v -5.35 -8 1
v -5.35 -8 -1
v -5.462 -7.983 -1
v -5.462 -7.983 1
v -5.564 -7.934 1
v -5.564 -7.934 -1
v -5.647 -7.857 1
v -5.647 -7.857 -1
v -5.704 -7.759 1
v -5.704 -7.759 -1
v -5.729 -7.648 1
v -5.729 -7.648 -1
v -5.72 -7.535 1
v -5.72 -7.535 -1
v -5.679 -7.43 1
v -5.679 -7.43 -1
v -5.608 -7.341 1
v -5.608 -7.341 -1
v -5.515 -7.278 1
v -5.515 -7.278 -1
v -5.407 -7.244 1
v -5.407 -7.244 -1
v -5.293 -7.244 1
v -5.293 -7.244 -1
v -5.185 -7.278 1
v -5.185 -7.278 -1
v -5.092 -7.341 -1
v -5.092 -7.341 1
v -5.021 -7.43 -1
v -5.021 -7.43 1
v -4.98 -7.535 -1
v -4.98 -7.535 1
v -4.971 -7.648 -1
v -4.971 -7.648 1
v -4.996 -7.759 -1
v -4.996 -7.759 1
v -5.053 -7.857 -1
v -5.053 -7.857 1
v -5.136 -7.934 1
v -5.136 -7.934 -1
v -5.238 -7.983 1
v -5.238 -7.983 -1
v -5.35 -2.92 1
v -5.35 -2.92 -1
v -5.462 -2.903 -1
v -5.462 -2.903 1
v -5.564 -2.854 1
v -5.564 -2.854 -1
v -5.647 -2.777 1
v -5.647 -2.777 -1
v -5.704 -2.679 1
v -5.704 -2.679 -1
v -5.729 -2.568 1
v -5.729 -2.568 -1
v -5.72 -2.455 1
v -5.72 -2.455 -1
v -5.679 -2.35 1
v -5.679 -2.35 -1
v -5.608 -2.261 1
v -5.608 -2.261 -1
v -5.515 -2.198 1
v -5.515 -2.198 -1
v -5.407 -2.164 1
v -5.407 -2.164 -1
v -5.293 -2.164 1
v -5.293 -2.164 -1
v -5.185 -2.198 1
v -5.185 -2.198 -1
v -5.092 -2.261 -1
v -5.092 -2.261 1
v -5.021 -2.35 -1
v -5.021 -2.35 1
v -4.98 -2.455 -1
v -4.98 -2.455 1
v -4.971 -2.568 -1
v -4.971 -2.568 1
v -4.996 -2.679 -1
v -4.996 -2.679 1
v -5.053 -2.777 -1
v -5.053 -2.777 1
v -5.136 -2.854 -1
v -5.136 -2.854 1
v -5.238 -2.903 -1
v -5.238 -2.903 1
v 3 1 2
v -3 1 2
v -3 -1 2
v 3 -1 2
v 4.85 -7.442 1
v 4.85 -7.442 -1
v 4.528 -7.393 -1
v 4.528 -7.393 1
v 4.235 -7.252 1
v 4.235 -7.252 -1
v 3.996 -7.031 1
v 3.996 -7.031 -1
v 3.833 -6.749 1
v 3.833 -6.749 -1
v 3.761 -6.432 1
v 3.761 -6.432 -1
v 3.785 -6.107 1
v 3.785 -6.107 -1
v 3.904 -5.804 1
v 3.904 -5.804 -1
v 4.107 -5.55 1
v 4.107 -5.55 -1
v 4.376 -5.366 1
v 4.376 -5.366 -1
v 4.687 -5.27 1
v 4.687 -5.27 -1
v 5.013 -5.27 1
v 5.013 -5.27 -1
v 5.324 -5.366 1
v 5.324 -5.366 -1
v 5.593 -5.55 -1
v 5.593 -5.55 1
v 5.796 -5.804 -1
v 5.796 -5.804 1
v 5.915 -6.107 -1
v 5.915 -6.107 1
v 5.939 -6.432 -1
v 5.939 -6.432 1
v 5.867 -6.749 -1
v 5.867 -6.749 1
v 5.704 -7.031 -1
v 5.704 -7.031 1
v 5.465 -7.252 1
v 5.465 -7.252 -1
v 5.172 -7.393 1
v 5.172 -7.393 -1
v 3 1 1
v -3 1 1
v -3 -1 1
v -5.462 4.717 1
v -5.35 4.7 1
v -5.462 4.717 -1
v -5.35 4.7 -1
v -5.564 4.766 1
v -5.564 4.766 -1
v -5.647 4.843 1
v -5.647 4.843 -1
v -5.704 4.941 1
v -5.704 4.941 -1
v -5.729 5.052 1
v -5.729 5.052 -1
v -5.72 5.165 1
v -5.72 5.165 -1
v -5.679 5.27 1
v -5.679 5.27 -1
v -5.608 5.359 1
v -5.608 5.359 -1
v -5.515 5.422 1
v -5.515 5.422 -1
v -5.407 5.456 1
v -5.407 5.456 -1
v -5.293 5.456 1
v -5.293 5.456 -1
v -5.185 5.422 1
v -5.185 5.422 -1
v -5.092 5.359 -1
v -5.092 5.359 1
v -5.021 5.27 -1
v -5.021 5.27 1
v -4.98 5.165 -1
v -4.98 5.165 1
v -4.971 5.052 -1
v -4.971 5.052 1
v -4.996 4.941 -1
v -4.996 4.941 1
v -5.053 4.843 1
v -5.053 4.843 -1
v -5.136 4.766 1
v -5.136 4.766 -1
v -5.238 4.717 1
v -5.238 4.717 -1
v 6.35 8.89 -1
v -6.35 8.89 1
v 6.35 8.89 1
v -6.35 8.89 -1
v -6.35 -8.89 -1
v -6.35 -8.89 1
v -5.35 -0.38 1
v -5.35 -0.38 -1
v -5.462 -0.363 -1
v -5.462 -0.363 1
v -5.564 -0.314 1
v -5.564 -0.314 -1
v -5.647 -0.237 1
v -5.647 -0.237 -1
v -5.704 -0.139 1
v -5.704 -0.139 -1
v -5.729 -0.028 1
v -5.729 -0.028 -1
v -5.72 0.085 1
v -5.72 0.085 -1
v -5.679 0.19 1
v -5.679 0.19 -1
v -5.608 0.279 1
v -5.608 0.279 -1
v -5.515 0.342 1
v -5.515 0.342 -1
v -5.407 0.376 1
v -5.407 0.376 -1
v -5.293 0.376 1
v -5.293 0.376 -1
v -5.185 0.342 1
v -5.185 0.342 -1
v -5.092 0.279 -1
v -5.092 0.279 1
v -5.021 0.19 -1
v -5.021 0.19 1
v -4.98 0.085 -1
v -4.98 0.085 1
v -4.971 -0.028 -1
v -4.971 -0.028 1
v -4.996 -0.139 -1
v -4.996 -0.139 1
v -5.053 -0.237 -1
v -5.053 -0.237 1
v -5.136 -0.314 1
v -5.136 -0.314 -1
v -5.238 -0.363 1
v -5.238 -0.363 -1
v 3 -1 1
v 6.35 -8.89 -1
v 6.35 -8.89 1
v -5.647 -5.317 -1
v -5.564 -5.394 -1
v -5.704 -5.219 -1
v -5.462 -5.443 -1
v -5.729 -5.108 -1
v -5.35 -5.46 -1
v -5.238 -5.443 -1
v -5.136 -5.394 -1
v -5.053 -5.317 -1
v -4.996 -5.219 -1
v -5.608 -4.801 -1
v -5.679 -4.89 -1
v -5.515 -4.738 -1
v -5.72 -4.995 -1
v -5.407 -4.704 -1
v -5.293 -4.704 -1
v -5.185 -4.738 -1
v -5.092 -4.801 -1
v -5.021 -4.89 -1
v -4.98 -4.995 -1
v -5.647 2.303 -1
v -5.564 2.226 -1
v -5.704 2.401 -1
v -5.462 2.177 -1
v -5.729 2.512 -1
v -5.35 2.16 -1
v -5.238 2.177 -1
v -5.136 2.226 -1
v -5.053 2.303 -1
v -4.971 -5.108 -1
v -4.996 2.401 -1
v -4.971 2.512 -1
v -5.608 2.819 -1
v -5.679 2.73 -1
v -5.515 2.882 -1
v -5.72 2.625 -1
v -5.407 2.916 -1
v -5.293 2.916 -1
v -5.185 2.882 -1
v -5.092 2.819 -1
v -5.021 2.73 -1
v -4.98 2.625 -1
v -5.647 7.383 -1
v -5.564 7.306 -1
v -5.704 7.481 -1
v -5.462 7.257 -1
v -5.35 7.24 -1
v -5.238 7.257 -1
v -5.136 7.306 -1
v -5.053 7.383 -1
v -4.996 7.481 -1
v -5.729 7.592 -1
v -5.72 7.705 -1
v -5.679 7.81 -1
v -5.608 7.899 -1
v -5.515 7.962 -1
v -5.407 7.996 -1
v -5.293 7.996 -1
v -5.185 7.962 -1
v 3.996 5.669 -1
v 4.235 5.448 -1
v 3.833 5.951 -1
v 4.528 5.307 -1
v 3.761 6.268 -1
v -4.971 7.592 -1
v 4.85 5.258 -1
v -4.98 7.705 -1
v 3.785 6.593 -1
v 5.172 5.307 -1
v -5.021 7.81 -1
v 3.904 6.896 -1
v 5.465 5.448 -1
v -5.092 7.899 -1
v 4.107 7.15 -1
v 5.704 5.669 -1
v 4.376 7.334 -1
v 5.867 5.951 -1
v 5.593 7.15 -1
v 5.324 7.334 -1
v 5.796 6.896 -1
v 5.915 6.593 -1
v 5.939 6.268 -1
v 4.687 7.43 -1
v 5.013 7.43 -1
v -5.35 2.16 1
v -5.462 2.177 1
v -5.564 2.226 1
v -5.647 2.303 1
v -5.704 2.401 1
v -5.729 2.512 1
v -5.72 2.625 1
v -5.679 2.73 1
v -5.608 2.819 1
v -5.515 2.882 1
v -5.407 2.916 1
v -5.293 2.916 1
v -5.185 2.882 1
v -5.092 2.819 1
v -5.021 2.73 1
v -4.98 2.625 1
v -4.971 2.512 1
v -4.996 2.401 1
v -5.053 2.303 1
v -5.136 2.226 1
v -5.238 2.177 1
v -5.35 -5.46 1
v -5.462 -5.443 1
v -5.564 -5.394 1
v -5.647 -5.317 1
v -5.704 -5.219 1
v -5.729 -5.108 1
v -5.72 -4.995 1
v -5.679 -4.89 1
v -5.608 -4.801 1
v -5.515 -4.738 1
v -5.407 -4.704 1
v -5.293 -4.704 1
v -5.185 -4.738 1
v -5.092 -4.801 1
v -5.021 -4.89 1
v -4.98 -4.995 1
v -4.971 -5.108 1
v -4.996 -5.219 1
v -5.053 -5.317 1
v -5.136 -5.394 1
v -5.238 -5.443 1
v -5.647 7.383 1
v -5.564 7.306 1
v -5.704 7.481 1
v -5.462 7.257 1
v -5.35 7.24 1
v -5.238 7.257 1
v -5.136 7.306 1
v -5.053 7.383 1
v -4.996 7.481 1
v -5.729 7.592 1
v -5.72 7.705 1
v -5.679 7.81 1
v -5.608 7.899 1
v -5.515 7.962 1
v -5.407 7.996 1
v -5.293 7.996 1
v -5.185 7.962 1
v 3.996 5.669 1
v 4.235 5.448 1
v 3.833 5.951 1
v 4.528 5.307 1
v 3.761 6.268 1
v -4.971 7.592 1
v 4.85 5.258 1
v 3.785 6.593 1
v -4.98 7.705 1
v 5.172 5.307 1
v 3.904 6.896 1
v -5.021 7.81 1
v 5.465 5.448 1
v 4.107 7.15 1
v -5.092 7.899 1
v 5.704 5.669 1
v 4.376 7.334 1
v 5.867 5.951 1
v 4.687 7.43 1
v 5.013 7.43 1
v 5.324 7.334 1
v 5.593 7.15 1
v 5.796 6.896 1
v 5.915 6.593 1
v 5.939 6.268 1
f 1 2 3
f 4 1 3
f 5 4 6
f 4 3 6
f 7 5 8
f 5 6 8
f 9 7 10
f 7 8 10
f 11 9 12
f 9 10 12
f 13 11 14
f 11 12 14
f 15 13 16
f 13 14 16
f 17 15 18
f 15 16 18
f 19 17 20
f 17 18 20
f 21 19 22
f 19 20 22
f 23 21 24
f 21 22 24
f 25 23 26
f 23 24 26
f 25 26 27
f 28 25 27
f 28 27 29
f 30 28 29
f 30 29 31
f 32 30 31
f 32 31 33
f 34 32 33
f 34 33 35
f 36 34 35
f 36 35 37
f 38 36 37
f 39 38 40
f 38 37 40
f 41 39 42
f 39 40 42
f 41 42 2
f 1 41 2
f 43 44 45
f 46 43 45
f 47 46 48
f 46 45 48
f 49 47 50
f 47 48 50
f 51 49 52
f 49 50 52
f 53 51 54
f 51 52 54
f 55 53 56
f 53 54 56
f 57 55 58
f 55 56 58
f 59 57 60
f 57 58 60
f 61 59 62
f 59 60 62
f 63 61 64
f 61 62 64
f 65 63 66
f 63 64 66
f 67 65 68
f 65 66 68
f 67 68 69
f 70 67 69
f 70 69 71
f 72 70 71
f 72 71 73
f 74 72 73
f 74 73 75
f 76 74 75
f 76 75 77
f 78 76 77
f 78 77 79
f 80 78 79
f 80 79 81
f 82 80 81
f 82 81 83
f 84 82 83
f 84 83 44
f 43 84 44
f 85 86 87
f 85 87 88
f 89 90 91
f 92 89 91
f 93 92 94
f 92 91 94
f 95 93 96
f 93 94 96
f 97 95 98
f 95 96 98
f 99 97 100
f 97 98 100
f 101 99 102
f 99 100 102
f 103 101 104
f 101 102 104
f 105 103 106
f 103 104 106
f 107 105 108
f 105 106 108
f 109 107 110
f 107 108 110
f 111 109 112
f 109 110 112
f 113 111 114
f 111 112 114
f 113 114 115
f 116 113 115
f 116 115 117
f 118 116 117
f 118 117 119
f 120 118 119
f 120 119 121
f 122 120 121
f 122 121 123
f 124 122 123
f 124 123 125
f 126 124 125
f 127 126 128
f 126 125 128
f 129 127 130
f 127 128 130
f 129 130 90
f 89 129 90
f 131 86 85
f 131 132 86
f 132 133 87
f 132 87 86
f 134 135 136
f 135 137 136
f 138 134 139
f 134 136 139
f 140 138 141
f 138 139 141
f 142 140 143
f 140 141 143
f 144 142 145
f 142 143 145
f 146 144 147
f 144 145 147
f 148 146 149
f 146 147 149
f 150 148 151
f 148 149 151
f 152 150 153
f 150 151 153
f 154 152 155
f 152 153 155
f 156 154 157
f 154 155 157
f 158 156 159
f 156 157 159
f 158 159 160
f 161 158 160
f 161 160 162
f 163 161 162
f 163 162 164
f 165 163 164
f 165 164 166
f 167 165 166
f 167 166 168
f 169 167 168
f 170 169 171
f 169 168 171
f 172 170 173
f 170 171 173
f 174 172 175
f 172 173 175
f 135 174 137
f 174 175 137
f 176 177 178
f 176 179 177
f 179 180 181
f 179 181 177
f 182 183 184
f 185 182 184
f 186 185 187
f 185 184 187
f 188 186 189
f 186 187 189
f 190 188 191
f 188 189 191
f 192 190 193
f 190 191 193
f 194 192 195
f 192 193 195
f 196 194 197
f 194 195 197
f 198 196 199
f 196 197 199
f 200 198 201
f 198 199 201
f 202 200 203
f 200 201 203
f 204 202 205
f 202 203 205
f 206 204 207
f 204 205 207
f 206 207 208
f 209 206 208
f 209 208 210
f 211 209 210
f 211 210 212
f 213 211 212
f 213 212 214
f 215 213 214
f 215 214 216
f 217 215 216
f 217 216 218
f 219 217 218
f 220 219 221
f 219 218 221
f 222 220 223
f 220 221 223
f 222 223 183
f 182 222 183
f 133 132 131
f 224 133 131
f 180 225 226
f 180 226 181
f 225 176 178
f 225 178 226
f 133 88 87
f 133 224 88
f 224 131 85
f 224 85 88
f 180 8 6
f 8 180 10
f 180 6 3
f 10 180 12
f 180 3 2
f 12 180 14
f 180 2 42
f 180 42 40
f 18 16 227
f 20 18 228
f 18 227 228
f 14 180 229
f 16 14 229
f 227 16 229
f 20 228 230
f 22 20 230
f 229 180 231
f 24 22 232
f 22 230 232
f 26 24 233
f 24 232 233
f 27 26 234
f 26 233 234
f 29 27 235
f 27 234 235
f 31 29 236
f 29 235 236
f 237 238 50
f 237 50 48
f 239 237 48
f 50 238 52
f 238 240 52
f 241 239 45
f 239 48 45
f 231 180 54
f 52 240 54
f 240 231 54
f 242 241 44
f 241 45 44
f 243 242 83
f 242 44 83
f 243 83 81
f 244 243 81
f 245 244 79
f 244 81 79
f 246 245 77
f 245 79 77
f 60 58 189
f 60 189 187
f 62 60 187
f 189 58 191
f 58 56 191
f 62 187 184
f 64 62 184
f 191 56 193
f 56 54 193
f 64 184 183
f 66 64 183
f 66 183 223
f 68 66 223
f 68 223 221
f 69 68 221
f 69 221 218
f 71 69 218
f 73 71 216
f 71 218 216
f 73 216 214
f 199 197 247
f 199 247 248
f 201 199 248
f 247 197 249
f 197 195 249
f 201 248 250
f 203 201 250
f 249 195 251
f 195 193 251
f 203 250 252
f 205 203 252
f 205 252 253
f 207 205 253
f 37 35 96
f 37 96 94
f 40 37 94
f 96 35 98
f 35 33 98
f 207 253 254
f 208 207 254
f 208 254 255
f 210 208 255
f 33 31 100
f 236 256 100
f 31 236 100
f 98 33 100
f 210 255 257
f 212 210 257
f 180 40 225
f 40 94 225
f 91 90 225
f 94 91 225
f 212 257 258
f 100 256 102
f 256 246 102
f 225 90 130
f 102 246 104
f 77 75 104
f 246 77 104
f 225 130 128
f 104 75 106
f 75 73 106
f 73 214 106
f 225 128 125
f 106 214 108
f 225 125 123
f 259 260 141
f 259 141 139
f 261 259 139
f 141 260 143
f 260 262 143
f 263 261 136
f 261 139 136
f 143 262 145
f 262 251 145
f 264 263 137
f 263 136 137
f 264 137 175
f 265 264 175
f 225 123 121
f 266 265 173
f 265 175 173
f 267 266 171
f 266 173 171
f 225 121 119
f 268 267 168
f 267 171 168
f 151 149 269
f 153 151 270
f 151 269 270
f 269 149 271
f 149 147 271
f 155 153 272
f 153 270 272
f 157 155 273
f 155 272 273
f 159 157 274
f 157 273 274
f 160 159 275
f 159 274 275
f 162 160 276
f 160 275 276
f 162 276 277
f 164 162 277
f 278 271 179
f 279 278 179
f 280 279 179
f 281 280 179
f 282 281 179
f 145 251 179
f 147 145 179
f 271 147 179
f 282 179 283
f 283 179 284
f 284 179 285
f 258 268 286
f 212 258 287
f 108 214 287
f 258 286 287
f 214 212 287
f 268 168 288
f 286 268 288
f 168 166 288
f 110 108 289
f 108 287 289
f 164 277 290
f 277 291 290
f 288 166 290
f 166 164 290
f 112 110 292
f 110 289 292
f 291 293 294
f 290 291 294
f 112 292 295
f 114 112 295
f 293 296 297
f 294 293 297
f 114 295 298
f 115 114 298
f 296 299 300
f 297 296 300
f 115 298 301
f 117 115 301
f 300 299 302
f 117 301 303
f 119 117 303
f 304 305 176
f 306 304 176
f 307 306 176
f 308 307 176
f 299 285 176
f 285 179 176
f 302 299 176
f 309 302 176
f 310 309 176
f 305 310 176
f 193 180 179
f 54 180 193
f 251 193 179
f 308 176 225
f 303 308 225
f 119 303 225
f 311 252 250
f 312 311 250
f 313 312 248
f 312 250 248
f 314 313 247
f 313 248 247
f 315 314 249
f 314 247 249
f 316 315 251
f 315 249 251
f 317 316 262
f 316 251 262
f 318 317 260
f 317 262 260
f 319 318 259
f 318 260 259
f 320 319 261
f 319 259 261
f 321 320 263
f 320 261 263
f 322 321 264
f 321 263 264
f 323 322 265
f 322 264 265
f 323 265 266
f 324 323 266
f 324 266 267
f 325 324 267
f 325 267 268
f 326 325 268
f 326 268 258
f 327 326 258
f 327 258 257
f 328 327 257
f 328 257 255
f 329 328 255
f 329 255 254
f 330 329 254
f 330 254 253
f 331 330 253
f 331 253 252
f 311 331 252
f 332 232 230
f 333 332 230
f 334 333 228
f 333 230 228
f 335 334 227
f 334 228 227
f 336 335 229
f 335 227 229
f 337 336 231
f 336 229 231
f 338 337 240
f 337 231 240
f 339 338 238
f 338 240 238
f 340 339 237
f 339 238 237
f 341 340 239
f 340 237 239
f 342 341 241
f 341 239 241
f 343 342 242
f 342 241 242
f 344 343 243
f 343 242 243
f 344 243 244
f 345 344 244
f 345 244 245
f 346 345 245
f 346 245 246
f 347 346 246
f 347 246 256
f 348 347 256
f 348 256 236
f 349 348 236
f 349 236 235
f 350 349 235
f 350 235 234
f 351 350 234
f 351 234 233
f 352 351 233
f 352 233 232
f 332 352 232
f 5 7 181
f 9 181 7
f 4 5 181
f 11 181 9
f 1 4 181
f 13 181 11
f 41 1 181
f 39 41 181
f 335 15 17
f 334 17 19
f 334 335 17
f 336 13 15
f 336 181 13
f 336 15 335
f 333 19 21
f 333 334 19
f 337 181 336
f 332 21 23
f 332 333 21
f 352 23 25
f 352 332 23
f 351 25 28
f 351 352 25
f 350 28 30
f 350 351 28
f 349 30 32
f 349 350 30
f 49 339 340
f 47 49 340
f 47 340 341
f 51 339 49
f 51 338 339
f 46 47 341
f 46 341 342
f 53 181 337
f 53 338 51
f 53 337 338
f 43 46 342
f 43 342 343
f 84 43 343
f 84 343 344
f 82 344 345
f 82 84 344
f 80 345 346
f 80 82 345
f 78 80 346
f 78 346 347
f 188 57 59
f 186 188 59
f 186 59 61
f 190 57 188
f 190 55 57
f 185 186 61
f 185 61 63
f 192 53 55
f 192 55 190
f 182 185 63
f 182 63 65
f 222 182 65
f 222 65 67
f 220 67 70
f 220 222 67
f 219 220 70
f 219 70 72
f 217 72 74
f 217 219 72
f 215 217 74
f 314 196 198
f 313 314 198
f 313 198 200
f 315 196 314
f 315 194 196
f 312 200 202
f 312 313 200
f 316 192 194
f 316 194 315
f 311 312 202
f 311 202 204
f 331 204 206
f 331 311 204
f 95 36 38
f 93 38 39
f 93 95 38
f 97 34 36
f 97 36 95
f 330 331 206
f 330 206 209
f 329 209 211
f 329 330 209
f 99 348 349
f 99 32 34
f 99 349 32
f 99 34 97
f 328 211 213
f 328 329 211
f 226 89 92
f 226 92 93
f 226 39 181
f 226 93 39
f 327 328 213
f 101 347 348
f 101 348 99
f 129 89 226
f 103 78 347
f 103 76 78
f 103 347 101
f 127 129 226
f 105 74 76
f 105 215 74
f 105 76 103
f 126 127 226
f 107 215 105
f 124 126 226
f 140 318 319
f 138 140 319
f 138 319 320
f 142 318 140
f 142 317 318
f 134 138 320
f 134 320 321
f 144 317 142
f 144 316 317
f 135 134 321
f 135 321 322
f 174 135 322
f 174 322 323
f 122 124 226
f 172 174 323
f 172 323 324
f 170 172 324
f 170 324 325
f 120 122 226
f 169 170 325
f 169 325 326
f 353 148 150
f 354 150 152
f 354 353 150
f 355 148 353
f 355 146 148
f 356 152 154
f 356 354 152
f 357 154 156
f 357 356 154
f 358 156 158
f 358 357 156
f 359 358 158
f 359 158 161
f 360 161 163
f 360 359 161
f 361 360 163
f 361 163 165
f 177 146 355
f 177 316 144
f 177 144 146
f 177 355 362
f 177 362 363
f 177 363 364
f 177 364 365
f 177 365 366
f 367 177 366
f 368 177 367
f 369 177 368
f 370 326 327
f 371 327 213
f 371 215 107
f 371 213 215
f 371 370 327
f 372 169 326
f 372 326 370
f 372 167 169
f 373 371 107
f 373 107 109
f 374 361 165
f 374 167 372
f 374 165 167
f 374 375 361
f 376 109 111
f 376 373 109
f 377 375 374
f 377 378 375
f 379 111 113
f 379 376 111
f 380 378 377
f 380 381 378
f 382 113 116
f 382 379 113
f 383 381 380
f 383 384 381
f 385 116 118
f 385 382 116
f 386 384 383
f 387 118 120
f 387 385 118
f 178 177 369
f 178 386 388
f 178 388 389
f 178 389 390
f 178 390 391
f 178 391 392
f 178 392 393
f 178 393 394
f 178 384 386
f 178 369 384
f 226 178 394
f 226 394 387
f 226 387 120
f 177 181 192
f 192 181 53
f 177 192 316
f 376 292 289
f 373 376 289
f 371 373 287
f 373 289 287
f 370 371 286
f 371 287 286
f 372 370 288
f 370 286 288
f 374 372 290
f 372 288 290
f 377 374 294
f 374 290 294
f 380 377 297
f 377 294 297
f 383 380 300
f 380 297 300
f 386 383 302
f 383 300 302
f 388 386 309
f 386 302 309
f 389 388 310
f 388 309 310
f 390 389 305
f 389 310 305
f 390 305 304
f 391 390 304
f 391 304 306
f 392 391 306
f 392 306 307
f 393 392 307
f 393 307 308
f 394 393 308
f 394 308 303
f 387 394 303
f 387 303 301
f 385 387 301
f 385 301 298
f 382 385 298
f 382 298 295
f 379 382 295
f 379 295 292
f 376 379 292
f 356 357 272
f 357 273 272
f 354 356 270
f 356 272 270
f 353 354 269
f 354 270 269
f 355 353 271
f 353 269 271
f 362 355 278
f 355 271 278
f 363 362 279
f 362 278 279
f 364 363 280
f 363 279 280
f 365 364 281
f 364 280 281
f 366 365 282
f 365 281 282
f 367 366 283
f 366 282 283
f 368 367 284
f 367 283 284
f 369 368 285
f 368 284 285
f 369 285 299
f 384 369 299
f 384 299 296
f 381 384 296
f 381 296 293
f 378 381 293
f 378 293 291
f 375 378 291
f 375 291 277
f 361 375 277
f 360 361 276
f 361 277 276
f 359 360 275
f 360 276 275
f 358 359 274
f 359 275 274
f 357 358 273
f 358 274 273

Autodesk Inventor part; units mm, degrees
ref_plane "YZ Plane" through (0, 0, 0) normal (1, 0, 0) x (0, 1, 0)
ref_plane "XZ Plane" through (0, 0, 0) normal (0, 1, 0) x (-1, 0, 0)
ref_plane "XY Plane" through (0, 0, 0) normal (0, 0, 1) x (1, 0, 0)
sketch "Sketch1" plane through (0, 0, 0) normal (0, 0, 1) x (1, 0, 0)
  line L0 (-8.89, 0) -> (8.89, 0) projected
  line L1 (0, -12.446) -> (0, 12.446) projected
  line L2 (-6.35, 8.89) -> (6.35, 8.89)
  line L3 (6.35, 8.89) -> (6.35, -8.89)
  line L4 (6.35, -8.89) -> (-6.35, -8.89)
  line L5 (-6.35, -8.89) -> (-6.35, 8.89)
  line L6 (-6.35, 8.89) -> (6.35, -8.89) construction
  line L7 (6.35, 8.89) -> (-6.35, -8.89) construction
  point P0 (0, 0)
  dimension "d0" = 17.78
  dimension "d1" = 12.7
extrude "Extrusion1" add sketch "Sketch1" along normal mid plane 2
sketch "Sketch2" plane through (0, 0, 1) normal (0, 0, 1) x (1, 0, 0)
  line L0 (-6.35, 8.89) -> (-6.35, -8.89) projected
  line L1 (6.35, 8.89) -> (-6.35, 8.89) projected
  line L2 (-6.35, -8.89) -> (6.35, -8.89) projected
  point P0 (0, 0)
  point P1 (-5.35, 0)
  point P2 (-5.35, -2.54)
  point P3 (-5.35, 2.54)
  point P4 (-5.35, -5.08)
  point P5 (-5.35, -7.62)
  point P6 (-5.35, 5.08)
  point P7 (-5.35, 7.62)
  dimension "d11" = 2.54
  dimension "d12" = 1
  dimension "d13" = 1
  dimension "d14" = 1
  dimension "d15" = 1
  dimension "d16" = 2.54
  dimension "d17" = 2.54
  dimension "d18" = 1.27
  dimension "d19" = 1.27
  dimension "d20" = 2.54
  dimension "d21" = 2.54
  dimension "d22" = 1
  dimension "d23" = 1
  dimension "d24" = 1
hole "Hole1" at (-5.35, 0, 1) at (-5.35, -2.54, 1) at (-5.35, 2.54, 1) at (-5.35, -5.08, 1) at (-5.35, -7.62, 1) at (-5.35, 5.08, 1) at (-5.35, 7.62, 1) direction (0, 0, -1) diameter 0.76 end through all
sketch "Sketch3" plane through (0, 0, 1) normal (0, 0, 1) x (1, 0, 0)
  line L0 (-6.35, -8.89) -> (6.35, -8.89) projected
  line L1 (6.35, -8.89) -> (6.35, 8.89) projected
  point P0 (0, 0)
  point P1 (4.85, 6.35)
  point P2 (4.85, -6.35)
  dimension "d32" = 12.7
  dimension "d33" = 2.54
  dimension "d34" = 1.5
  dimension "d35" = 1.5
hole "Hole2" at (4.85, 6.35, 1) at (4.85, -6.35, 1) direction (0, 0, -1) diameter 2.184 end through all
sketch "Sketch4" plane through (0, 0, 1) normal (0, 0, 1) x (1, 0, 0)
  line L0 (-3, 1) -> (3, 1)
  line L1 (3, 1) -> (3, -1)
  line L2 (3, -1) -> (-3, -1)
  line L3 (-3, -1) -> (-3, 1)
  line L4 (-3, 1) -> (3, -1) construction
  line L5 (3, 1) -> (-3, -1) construction
  point P0 (0, 0)
  dimension "d36" = 6
  dimension "d37" = 2
extrude "Extrusion2" add sketch "Sketch4" along normal blind 1 separate body
sketch "Sketch5" plane through (0, 0, 1) normal (0, 0, 1) x (1, 0, 0)
  line L0 (-4.5172, 4.5869) -> (11.2934, 4.5869) construction
  line L1 (11.2934, 4.5869) -> (11.2934, 1.4006) construction
  line L2 (11.2934, 1.4006) -> (-4.5172, 1.4006) construction
  line L3 (-4.5172, 1.4006) -> (-4.5172, 4.5869) construction
  point P0 (0, 0)
properties part number "VL6180x_czujnik"
